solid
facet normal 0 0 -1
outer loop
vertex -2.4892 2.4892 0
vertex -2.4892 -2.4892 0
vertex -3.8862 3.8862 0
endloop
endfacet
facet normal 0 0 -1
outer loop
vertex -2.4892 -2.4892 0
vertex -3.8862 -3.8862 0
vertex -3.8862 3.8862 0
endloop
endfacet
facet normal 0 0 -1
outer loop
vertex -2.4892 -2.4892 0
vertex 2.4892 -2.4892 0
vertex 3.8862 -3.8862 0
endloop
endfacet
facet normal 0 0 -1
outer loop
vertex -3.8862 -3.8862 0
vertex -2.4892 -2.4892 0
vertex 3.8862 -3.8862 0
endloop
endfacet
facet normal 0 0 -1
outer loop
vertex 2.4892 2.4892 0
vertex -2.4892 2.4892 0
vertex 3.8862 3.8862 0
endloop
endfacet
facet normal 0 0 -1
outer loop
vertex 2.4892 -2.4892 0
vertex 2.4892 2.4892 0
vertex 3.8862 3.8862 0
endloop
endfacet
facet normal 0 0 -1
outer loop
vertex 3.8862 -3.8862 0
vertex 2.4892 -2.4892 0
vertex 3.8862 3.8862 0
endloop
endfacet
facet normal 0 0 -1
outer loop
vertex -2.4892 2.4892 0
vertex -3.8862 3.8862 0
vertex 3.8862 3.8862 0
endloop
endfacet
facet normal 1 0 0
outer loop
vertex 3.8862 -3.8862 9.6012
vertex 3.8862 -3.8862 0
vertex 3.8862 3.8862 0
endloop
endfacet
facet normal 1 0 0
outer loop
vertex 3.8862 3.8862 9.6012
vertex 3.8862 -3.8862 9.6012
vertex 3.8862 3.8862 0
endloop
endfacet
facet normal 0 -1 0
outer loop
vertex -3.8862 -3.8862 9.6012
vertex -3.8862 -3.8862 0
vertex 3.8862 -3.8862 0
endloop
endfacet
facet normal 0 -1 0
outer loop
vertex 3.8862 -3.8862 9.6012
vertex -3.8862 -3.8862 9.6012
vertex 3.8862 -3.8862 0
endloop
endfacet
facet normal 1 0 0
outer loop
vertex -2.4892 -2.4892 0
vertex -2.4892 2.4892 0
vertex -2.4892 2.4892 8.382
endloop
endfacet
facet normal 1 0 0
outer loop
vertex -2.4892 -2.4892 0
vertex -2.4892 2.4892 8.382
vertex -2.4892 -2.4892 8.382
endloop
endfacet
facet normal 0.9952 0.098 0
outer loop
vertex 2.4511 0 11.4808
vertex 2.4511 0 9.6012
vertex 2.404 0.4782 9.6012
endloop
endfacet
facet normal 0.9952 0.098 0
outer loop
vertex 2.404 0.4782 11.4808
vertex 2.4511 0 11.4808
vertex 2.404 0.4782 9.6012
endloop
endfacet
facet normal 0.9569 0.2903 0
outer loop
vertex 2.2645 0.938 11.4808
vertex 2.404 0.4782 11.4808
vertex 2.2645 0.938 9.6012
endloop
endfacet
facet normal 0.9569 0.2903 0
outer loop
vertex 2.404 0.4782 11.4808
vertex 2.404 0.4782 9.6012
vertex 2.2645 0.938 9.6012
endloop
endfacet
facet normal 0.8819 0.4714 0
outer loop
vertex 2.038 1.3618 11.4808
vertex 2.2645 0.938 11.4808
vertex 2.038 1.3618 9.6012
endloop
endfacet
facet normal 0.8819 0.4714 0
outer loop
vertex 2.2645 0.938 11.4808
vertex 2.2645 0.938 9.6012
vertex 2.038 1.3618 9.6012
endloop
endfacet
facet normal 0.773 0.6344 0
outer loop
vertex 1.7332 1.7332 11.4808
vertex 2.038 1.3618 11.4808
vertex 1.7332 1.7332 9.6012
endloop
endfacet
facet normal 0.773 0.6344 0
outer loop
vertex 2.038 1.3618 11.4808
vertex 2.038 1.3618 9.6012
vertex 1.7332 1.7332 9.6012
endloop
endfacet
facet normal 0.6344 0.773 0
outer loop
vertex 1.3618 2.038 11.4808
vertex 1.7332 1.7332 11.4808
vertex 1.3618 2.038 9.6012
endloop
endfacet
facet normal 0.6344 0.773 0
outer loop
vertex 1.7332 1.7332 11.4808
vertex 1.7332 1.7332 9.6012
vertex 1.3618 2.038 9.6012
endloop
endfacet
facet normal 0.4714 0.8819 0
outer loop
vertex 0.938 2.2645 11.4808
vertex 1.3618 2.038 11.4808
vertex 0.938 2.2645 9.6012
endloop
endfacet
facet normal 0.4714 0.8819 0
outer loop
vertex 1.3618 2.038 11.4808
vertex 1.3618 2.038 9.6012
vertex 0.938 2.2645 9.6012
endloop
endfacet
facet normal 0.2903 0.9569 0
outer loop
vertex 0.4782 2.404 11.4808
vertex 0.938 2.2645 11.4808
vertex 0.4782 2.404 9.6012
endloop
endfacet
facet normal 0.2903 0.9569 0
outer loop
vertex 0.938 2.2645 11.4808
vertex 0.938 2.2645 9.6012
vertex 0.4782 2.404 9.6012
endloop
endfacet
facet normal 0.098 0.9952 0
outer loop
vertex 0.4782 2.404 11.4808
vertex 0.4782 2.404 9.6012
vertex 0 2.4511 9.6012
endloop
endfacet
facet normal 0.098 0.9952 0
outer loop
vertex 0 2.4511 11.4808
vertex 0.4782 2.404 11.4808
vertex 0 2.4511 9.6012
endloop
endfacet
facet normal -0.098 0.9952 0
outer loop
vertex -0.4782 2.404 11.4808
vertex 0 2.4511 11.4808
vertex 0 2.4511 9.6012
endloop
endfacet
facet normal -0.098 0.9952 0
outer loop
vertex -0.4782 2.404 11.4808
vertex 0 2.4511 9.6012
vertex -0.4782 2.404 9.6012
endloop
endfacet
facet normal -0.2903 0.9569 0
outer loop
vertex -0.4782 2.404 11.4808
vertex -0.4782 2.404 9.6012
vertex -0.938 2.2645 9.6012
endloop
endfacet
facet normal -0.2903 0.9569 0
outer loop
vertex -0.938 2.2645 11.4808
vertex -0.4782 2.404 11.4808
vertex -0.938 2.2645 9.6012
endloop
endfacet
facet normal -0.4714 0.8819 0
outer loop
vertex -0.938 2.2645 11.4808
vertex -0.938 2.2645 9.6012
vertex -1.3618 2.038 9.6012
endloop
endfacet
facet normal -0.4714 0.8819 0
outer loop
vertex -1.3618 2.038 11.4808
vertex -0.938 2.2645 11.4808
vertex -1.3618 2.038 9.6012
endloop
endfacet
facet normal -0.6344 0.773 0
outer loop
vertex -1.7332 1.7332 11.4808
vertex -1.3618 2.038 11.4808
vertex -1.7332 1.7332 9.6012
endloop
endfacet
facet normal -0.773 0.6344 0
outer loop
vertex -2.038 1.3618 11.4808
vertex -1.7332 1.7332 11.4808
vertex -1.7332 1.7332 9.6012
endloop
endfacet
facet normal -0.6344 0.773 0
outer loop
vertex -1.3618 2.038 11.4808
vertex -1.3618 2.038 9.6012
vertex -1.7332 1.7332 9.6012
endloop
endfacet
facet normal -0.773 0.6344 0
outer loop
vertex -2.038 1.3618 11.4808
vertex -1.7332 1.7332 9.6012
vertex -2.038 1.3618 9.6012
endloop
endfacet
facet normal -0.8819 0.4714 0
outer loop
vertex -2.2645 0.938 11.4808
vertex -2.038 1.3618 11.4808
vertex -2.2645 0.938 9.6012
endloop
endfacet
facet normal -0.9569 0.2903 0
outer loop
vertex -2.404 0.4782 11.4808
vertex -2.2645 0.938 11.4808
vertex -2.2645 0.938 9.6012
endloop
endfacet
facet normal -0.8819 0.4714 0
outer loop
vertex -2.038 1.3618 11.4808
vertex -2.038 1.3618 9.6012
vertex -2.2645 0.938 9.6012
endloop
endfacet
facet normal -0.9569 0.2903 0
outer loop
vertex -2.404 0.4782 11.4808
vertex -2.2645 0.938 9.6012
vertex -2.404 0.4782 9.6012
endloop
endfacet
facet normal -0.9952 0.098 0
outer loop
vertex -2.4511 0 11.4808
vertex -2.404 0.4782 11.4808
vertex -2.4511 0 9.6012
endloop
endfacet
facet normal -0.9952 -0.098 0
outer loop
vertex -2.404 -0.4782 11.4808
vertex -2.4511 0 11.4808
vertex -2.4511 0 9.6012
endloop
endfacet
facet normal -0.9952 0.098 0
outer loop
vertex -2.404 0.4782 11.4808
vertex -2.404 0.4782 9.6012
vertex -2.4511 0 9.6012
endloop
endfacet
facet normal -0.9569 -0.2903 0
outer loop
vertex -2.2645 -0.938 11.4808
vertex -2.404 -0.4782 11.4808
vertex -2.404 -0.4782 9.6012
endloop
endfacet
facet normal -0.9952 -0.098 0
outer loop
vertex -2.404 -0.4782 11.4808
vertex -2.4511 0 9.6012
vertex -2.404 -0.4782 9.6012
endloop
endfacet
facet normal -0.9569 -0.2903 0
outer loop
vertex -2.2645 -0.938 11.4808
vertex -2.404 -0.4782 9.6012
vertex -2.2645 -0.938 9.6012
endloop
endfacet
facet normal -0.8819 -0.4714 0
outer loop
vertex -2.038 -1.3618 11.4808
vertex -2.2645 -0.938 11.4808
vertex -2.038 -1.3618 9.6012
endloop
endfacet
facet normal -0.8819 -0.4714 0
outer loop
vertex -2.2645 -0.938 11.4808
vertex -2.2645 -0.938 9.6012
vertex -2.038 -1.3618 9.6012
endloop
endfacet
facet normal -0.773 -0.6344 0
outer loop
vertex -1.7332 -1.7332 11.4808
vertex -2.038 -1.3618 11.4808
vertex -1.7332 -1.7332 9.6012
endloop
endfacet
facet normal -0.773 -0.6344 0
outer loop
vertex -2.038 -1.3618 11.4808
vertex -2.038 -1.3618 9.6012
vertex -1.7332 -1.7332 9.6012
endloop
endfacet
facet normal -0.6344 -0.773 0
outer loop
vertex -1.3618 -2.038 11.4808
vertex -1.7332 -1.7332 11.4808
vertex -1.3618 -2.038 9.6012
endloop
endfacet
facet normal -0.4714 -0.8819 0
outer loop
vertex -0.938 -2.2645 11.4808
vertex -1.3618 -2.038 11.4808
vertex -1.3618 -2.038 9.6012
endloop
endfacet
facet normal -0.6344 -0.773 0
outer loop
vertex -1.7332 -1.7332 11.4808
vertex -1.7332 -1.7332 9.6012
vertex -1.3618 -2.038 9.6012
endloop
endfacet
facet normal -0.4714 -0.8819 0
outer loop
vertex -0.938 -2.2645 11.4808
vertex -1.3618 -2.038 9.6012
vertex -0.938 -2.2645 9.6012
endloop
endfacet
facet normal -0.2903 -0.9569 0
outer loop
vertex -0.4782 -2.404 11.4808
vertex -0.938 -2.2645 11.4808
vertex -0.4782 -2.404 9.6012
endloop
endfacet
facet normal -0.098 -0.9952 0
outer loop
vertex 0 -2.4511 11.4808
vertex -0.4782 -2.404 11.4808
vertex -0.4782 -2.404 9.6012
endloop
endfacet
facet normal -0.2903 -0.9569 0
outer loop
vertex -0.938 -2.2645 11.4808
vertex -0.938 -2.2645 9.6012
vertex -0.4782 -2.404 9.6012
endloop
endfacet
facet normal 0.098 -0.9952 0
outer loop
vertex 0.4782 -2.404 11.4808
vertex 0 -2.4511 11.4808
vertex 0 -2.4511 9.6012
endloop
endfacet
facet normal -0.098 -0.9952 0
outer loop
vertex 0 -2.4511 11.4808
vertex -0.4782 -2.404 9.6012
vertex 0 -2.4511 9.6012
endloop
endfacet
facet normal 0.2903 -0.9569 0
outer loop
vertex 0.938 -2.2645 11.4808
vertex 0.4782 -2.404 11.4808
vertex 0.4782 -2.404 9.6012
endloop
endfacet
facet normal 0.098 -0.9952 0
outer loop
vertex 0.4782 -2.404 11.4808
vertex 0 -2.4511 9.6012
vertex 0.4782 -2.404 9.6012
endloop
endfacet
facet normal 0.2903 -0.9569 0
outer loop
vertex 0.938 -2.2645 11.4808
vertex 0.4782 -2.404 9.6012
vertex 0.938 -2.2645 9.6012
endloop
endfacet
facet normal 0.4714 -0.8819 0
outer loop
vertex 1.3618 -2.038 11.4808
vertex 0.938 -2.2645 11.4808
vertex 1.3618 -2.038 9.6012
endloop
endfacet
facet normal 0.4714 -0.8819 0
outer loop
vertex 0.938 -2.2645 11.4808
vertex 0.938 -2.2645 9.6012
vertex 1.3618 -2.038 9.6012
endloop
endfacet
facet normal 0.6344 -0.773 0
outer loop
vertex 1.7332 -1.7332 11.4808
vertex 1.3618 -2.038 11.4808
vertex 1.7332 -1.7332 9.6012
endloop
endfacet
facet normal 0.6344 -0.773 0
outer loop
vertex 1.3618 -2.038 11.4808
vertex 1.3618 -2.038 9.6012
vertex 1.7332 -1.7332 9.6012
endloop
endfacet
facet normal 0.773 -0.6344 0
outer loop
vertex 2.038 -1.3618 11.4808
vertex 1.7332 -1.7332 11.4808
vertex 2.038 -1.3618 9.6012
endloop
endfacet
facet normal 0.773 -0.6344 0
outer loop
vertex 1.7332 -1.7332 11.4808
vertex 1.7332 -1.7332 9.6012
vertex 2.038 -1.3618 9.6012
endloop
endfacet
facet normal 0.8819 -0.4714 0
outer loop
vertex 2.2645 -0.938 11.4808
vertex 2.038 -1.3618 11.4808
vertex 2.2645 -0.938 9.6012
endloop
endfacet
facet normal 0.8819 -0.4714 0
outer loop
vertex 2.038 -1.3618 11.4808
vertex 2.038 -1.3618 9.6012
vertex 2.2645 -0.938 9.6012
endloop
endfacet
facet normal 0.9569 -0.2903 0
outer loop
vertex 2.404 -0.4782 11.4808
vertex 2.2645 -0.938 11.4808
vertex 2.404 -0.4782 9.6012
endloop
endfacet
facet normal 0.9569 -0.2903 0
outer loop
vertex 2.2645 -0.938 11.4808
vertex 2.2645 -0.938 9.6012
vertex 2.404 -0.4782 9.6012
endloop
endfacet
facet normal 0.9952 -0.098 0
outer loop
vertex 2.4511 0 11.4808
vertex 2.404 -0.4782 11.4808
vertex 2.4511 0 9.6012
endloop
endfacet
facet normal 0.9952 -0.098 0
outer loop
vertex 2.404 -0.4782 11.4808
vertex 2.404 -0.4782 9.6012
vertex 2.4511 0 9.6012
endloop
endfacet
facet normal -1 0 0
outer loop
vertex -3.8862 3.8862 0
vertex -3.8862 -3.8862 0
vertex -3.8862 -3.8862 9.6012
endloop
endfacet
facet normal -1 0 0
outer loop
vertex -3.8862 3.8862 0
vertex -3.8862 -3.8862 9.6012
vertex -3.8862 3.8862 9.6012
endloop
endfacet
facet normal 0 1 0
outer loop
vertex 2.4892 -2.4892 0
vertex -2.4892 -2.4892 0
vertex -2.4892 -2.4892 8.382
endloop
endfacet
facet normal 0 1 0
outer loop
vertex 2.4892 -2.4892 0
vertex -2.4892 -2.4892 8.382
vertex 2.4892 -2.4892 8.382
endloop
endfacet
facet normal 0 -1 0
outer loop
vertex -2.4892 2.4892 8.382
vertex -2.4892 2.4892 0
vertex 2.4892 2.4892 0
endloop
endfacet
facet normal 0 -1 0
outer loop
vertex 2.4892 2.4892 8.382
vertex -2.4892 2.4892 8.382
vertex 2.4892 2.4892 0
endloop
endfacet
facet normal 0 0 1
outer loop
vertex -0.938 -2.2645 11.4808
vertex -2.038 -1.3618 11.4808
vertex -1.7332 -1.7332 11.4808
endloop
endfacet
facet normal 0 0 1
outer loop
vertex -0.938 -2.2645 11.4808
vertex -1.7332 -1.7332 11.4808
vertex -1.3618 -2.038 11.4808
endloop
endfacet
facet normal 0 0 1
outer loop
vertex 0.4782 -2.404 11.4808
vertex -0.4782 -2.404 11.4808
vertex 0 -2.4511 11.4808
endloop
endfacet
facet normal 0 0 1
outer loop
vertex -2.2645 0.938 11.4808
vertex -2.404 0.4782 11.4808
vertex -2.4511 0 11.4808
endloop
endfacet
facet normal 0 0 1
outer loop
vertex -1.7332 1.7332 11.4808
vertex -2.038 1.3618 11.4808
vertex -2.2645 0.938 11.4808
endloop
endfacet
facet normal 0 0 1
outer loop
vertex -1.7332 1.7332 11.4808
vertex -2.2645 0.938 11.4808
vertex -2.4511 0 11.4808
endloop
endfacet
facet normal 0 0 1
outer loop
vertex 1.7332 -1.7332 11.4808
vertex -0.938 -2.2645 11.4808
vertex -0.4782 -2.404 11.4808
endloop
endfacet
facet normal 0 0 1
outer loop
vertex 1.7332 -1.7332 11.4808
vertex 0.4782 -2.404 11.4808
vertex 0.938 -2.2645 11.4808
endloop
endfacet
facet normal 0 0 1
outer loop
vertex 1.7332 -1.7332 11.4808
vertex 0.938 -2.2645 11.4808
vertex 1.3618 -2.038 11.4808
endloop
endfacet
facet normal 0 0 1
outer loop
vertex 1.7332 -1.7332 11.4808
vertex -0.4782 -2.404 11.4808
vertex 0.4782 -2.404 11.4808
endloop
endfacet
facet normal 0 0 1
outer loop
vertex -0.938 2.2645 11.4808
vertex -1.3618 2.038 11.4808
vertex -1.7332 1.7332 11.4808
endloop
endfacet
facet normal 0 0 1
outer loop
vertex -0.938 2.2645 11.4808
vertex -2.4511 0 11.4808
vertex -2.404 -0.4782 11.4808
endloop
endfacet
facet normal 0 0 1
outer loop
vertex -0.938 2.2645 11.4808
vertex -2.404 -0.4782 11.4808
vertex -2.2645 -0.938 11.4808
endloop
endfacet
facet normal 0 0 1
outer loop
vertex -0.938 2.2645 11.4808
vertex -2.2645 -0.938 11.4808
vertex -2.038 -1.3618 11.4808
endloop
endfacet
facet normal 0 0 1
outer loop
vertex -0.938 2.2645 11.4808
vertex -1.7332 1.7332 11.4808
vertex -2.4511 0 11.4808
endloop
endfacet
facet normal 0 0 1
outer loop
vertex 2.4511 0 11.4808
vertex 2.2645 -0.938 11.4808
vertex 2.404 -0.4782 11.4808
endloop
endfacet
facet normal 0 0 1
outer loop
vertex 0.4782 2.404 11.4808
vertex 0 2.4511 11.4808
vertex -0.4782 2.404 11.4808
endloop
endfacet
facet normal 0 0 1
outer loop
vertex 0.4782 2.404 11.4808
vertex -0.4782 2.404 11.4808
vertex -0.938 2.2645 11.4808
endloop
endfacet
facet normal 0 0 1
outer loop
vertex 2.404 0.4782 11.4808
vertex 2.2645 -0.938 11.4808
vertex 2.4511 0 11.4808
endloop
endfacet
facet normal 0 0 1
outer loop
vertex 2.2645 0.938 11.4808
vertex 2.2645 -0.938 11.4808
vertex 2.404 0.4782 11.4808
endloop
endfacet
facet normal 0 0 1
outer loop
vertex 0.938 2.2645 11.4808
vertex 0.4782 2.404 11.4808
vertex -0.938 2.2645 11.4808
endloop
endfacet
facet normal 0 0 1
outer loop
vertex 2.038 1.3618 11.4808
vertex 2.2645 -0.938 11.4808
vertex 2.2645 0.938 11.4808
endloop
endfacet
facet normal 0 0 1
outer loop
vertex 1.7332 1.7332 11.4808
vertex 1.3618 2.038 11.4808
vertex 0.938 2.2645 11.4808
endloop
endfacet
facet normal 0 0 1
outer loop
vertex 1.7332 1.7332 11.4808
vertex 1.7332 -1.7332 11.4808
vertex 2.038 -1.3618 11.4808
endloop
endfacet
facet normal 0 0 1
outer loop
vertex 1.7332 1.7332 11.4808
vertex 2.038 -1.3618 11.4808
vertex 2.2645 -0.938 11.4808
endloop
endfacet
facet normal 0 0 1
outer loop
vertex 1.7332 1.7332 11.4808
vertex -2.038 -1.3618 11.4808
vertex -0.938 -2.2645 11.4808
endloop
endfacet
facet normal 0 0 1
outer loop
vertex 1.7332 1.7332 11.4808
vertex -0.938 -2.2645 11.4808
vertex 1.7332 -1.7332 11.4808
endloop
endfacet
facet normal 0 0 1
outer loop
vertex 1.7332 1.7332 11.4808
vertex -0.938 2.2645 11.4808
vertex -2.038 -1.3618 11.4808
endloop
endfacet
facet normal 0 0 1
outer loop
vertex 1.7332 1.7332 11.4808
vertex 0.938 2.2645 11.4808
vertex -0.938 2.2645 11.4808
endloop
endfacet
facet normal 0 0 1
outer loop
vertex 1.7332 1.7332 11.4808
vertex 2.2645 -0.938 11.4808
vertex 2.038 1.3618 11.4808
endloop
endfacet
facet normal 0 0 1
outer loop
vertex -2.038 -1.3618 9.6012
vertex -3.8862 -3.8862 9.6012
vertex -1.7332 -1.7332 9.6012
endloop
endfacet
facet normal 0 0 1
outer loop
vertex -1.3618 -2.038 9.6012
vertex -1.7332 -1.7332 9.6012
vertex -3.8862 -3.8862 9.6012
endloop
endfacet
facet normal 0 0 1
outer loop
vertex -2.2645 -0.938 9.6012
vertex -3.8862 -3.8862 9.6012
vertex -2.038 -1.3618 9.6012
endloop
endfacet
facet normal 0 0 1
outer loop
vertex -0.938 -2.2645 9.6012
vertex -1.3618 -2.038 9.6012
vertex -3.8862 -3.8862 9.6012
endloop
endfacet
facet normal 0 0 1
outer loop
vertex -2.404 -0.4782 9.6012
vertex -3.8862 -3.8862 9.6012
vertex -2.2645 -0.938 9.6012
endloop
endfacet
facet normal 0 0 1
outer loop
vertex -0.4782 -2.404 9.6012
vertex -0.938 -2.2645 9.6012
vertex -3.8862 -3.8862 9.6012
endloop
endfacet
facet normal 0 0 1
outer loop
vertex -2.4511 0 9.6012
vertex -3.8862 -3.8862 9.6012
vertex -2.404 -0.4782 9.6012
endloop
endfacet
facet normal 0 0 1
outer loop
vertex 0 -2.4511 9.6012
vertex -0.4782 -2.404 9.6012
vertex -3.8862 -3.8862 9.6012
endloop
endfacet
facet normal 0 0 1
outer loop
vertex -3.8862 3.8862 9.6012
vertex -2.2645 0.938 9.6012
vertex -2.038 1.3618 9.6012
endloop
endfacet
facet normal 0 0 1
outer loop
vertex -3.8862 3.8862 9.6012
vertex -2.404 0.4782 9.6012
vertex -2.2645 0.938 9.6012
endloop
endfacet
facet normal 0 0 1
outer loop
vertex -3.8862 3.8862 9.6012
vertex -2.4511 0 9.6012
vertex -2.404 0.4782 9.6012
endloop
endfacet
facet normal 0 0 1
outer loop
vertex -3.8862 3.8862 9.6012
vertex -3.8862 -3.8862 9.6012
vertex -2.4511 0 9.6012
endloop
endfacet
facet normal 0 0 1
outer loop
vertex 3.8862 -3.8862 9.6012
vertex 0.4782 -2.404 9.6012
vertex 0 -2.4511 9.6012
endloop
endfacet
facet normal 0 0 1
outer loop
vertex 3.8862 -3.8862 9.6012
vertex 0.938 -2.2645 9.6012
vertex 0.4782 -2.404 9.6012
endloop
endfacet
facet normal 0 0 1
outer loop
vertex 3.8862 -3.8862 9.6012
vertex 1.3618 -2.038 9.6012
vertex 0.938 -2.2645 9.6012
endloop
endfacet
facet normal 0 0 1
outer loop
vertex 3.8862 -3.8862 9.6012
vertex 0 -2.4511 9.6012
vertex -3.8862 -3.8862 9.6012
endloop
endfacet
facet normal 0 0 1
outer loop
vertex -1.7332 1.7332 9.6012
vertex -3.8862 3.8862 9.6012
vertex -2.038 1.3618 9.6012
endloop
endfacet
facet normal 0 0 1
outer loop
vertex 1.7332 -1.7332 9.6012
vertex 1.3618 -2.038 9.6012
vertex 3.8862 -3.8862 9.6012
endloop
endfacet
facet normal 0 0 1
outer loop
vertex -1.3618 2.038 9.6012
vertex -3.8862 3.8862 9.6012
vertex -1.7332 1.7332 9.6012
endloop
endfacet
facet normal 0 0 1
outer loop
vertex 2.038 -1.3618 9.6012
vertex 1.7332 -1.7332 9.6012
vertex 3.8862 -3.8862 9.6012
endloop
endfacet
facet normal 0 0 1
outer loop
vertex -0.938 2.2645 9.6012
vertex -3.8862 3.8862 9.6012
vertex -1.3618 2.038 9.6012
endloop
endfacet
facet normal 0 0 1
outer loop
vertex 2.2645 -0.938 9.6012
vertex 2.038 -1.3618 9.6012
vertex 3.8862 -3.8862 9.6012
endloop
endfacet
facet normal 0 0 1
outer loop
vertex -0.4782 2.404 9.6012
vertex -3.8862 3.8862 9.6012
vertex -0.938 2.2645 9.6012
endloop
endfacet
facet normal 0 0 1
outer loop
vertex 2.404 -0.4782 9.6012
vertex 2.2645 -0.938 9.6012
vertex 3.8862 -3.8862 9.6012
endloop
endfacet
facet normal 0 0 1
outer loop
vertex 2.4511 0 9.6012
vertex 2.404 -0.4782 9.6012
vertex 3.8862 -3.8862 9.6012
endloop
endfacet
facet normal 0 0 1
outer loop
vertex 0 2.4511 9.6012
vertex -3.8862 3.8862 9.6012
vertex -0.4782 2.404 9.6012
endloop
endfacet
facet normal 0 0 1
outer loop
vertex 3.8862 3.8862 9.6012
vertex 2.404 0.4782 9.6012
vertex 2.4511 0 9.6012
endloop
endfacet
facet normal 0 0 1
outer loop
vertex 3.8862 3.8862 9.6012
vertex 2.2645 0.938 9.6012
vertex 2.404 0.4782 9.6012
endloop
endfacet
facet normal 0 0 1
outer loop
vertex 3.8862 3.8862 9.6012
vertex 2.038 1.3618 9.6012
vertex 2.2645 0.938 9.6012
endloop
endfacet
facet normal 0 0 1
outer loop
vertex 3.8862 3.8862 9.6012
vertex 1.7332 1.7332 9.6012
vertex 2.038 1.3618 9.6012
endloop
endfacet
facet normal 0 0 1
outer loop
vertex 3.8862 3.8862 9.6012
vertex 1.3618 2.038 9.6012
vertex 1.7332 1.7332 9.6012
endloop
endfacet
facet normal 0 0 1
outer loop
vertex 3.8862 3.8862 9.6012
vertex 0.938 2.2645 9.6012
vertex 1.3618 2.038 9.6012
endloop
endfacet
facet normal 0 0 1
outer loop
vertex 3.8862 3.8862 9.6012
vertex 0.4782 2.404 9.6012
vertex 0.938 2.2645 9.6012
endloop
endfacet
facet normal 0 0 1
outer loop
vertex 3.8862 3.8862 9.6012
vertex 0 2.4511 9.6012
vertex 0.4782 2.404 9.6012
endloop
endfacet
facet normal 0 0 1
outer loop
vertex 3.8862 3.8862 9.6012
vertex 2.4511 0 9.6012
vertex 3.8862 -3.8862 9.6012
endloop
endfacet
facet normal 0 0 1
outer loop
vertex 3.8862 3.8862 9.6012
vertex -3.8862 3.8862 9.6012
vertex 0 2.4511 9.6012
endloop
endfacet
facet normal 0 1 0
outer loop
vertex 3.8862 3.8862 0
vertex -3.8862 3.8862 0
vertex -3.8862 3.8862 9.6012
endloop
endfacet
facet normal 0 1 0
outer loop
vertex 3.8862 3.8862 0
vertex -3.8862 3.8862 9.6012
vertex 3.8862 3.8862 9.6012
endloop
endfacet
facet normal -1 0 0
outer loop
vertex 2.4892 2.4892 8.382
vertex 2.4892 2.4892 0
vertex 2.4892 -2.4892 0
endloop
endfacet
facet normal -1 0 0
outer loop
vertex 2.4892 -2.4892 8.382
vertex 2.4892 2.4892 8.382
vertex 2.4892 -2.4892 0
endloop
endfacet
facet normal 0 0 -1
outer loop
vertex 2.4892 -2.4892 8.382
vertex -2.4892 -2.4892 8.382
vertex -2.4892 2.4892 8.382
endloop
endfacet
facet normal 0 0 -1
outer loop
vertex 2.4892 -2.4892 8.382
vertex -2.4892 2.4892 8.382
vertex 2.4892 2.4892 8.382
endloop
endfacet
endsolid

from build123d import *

# Parameters (mm, degrees)
F0_W     = 7.7724
F0_H     = 7.7724
F1_DEPTH = 9.6012
F2_R     = 2.4511
F3_DEPTH = 1.8796
F4_W     = 4.9784
F4_H     = 4.9784
F5_DEPTH = 8.382


with BuildPart() as f1:
    # F0 (on Top) → F1 (new body)
    with BuildSketch(Plane.XY):
        Rectangle(F0_W, F0_H)
    extrude(amount=F1_DEPTH)

    # F2 (on face) → F3 (join)
    with BuildSketch(Plane.XY.offset(9.6012)):
        Circle(F2_R)
    extrude(amount=F3_DEPTH)

    # F4 (on face) → F5 (cut)
    with BuildSketch(Plane(origin=(0, 0, 0), x_dir=(1, 0, 0), z_dir=(0, 0, -1))):
        Rectangle(F4_W, F4_H)
    extrude(amount=-F5_DEPTH, mode=Mode.SUBTRACT)


solid = f1.part
